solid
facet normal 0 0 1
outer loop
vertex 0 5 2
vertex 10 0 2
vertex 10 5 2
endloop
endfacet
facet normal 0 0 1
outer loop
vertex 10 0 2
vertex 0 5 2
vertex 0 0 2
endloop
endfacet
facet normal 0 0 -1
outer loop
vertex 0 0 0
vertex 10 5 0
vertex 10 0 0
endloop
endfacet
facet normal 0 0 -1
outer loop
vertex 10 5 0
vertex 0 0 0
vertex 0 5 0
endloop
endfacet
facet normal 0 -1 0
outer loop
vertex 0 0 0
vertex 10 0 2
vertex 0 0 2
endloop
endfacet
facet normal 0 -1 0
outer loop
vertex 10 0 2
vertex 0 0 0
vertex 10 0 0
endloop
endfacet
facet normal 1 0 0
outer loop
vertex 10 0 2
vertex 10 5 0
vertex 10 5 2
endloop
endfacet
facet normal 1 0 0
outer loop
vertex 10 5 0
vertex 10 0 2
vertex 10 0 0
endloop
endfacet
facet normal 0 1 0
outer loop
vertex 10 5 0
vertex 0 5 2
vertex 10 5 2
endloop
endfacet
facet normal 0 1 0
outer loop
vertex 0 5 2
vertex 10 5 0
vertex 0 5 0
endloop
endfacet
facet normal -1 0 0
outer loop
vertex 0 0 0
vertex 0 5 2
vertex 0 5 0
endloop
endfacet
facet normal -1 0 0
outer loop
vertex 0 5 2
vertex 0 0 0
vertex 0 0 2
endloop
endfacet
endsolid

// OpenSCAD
// Zweck: -m 'modul(argumente)' – Modulkontext mit Argumenten wie im Code.
breite = 30;
function doppelt(x) = 2 * x;

module halter(w = 10, h = 2, d = 5) {
    cube([w, d, h]);
}

module teile() {
    module schraube(d = 2, l = 10) cylinder(h = l, d = d);
    schraube();
}

halter();
